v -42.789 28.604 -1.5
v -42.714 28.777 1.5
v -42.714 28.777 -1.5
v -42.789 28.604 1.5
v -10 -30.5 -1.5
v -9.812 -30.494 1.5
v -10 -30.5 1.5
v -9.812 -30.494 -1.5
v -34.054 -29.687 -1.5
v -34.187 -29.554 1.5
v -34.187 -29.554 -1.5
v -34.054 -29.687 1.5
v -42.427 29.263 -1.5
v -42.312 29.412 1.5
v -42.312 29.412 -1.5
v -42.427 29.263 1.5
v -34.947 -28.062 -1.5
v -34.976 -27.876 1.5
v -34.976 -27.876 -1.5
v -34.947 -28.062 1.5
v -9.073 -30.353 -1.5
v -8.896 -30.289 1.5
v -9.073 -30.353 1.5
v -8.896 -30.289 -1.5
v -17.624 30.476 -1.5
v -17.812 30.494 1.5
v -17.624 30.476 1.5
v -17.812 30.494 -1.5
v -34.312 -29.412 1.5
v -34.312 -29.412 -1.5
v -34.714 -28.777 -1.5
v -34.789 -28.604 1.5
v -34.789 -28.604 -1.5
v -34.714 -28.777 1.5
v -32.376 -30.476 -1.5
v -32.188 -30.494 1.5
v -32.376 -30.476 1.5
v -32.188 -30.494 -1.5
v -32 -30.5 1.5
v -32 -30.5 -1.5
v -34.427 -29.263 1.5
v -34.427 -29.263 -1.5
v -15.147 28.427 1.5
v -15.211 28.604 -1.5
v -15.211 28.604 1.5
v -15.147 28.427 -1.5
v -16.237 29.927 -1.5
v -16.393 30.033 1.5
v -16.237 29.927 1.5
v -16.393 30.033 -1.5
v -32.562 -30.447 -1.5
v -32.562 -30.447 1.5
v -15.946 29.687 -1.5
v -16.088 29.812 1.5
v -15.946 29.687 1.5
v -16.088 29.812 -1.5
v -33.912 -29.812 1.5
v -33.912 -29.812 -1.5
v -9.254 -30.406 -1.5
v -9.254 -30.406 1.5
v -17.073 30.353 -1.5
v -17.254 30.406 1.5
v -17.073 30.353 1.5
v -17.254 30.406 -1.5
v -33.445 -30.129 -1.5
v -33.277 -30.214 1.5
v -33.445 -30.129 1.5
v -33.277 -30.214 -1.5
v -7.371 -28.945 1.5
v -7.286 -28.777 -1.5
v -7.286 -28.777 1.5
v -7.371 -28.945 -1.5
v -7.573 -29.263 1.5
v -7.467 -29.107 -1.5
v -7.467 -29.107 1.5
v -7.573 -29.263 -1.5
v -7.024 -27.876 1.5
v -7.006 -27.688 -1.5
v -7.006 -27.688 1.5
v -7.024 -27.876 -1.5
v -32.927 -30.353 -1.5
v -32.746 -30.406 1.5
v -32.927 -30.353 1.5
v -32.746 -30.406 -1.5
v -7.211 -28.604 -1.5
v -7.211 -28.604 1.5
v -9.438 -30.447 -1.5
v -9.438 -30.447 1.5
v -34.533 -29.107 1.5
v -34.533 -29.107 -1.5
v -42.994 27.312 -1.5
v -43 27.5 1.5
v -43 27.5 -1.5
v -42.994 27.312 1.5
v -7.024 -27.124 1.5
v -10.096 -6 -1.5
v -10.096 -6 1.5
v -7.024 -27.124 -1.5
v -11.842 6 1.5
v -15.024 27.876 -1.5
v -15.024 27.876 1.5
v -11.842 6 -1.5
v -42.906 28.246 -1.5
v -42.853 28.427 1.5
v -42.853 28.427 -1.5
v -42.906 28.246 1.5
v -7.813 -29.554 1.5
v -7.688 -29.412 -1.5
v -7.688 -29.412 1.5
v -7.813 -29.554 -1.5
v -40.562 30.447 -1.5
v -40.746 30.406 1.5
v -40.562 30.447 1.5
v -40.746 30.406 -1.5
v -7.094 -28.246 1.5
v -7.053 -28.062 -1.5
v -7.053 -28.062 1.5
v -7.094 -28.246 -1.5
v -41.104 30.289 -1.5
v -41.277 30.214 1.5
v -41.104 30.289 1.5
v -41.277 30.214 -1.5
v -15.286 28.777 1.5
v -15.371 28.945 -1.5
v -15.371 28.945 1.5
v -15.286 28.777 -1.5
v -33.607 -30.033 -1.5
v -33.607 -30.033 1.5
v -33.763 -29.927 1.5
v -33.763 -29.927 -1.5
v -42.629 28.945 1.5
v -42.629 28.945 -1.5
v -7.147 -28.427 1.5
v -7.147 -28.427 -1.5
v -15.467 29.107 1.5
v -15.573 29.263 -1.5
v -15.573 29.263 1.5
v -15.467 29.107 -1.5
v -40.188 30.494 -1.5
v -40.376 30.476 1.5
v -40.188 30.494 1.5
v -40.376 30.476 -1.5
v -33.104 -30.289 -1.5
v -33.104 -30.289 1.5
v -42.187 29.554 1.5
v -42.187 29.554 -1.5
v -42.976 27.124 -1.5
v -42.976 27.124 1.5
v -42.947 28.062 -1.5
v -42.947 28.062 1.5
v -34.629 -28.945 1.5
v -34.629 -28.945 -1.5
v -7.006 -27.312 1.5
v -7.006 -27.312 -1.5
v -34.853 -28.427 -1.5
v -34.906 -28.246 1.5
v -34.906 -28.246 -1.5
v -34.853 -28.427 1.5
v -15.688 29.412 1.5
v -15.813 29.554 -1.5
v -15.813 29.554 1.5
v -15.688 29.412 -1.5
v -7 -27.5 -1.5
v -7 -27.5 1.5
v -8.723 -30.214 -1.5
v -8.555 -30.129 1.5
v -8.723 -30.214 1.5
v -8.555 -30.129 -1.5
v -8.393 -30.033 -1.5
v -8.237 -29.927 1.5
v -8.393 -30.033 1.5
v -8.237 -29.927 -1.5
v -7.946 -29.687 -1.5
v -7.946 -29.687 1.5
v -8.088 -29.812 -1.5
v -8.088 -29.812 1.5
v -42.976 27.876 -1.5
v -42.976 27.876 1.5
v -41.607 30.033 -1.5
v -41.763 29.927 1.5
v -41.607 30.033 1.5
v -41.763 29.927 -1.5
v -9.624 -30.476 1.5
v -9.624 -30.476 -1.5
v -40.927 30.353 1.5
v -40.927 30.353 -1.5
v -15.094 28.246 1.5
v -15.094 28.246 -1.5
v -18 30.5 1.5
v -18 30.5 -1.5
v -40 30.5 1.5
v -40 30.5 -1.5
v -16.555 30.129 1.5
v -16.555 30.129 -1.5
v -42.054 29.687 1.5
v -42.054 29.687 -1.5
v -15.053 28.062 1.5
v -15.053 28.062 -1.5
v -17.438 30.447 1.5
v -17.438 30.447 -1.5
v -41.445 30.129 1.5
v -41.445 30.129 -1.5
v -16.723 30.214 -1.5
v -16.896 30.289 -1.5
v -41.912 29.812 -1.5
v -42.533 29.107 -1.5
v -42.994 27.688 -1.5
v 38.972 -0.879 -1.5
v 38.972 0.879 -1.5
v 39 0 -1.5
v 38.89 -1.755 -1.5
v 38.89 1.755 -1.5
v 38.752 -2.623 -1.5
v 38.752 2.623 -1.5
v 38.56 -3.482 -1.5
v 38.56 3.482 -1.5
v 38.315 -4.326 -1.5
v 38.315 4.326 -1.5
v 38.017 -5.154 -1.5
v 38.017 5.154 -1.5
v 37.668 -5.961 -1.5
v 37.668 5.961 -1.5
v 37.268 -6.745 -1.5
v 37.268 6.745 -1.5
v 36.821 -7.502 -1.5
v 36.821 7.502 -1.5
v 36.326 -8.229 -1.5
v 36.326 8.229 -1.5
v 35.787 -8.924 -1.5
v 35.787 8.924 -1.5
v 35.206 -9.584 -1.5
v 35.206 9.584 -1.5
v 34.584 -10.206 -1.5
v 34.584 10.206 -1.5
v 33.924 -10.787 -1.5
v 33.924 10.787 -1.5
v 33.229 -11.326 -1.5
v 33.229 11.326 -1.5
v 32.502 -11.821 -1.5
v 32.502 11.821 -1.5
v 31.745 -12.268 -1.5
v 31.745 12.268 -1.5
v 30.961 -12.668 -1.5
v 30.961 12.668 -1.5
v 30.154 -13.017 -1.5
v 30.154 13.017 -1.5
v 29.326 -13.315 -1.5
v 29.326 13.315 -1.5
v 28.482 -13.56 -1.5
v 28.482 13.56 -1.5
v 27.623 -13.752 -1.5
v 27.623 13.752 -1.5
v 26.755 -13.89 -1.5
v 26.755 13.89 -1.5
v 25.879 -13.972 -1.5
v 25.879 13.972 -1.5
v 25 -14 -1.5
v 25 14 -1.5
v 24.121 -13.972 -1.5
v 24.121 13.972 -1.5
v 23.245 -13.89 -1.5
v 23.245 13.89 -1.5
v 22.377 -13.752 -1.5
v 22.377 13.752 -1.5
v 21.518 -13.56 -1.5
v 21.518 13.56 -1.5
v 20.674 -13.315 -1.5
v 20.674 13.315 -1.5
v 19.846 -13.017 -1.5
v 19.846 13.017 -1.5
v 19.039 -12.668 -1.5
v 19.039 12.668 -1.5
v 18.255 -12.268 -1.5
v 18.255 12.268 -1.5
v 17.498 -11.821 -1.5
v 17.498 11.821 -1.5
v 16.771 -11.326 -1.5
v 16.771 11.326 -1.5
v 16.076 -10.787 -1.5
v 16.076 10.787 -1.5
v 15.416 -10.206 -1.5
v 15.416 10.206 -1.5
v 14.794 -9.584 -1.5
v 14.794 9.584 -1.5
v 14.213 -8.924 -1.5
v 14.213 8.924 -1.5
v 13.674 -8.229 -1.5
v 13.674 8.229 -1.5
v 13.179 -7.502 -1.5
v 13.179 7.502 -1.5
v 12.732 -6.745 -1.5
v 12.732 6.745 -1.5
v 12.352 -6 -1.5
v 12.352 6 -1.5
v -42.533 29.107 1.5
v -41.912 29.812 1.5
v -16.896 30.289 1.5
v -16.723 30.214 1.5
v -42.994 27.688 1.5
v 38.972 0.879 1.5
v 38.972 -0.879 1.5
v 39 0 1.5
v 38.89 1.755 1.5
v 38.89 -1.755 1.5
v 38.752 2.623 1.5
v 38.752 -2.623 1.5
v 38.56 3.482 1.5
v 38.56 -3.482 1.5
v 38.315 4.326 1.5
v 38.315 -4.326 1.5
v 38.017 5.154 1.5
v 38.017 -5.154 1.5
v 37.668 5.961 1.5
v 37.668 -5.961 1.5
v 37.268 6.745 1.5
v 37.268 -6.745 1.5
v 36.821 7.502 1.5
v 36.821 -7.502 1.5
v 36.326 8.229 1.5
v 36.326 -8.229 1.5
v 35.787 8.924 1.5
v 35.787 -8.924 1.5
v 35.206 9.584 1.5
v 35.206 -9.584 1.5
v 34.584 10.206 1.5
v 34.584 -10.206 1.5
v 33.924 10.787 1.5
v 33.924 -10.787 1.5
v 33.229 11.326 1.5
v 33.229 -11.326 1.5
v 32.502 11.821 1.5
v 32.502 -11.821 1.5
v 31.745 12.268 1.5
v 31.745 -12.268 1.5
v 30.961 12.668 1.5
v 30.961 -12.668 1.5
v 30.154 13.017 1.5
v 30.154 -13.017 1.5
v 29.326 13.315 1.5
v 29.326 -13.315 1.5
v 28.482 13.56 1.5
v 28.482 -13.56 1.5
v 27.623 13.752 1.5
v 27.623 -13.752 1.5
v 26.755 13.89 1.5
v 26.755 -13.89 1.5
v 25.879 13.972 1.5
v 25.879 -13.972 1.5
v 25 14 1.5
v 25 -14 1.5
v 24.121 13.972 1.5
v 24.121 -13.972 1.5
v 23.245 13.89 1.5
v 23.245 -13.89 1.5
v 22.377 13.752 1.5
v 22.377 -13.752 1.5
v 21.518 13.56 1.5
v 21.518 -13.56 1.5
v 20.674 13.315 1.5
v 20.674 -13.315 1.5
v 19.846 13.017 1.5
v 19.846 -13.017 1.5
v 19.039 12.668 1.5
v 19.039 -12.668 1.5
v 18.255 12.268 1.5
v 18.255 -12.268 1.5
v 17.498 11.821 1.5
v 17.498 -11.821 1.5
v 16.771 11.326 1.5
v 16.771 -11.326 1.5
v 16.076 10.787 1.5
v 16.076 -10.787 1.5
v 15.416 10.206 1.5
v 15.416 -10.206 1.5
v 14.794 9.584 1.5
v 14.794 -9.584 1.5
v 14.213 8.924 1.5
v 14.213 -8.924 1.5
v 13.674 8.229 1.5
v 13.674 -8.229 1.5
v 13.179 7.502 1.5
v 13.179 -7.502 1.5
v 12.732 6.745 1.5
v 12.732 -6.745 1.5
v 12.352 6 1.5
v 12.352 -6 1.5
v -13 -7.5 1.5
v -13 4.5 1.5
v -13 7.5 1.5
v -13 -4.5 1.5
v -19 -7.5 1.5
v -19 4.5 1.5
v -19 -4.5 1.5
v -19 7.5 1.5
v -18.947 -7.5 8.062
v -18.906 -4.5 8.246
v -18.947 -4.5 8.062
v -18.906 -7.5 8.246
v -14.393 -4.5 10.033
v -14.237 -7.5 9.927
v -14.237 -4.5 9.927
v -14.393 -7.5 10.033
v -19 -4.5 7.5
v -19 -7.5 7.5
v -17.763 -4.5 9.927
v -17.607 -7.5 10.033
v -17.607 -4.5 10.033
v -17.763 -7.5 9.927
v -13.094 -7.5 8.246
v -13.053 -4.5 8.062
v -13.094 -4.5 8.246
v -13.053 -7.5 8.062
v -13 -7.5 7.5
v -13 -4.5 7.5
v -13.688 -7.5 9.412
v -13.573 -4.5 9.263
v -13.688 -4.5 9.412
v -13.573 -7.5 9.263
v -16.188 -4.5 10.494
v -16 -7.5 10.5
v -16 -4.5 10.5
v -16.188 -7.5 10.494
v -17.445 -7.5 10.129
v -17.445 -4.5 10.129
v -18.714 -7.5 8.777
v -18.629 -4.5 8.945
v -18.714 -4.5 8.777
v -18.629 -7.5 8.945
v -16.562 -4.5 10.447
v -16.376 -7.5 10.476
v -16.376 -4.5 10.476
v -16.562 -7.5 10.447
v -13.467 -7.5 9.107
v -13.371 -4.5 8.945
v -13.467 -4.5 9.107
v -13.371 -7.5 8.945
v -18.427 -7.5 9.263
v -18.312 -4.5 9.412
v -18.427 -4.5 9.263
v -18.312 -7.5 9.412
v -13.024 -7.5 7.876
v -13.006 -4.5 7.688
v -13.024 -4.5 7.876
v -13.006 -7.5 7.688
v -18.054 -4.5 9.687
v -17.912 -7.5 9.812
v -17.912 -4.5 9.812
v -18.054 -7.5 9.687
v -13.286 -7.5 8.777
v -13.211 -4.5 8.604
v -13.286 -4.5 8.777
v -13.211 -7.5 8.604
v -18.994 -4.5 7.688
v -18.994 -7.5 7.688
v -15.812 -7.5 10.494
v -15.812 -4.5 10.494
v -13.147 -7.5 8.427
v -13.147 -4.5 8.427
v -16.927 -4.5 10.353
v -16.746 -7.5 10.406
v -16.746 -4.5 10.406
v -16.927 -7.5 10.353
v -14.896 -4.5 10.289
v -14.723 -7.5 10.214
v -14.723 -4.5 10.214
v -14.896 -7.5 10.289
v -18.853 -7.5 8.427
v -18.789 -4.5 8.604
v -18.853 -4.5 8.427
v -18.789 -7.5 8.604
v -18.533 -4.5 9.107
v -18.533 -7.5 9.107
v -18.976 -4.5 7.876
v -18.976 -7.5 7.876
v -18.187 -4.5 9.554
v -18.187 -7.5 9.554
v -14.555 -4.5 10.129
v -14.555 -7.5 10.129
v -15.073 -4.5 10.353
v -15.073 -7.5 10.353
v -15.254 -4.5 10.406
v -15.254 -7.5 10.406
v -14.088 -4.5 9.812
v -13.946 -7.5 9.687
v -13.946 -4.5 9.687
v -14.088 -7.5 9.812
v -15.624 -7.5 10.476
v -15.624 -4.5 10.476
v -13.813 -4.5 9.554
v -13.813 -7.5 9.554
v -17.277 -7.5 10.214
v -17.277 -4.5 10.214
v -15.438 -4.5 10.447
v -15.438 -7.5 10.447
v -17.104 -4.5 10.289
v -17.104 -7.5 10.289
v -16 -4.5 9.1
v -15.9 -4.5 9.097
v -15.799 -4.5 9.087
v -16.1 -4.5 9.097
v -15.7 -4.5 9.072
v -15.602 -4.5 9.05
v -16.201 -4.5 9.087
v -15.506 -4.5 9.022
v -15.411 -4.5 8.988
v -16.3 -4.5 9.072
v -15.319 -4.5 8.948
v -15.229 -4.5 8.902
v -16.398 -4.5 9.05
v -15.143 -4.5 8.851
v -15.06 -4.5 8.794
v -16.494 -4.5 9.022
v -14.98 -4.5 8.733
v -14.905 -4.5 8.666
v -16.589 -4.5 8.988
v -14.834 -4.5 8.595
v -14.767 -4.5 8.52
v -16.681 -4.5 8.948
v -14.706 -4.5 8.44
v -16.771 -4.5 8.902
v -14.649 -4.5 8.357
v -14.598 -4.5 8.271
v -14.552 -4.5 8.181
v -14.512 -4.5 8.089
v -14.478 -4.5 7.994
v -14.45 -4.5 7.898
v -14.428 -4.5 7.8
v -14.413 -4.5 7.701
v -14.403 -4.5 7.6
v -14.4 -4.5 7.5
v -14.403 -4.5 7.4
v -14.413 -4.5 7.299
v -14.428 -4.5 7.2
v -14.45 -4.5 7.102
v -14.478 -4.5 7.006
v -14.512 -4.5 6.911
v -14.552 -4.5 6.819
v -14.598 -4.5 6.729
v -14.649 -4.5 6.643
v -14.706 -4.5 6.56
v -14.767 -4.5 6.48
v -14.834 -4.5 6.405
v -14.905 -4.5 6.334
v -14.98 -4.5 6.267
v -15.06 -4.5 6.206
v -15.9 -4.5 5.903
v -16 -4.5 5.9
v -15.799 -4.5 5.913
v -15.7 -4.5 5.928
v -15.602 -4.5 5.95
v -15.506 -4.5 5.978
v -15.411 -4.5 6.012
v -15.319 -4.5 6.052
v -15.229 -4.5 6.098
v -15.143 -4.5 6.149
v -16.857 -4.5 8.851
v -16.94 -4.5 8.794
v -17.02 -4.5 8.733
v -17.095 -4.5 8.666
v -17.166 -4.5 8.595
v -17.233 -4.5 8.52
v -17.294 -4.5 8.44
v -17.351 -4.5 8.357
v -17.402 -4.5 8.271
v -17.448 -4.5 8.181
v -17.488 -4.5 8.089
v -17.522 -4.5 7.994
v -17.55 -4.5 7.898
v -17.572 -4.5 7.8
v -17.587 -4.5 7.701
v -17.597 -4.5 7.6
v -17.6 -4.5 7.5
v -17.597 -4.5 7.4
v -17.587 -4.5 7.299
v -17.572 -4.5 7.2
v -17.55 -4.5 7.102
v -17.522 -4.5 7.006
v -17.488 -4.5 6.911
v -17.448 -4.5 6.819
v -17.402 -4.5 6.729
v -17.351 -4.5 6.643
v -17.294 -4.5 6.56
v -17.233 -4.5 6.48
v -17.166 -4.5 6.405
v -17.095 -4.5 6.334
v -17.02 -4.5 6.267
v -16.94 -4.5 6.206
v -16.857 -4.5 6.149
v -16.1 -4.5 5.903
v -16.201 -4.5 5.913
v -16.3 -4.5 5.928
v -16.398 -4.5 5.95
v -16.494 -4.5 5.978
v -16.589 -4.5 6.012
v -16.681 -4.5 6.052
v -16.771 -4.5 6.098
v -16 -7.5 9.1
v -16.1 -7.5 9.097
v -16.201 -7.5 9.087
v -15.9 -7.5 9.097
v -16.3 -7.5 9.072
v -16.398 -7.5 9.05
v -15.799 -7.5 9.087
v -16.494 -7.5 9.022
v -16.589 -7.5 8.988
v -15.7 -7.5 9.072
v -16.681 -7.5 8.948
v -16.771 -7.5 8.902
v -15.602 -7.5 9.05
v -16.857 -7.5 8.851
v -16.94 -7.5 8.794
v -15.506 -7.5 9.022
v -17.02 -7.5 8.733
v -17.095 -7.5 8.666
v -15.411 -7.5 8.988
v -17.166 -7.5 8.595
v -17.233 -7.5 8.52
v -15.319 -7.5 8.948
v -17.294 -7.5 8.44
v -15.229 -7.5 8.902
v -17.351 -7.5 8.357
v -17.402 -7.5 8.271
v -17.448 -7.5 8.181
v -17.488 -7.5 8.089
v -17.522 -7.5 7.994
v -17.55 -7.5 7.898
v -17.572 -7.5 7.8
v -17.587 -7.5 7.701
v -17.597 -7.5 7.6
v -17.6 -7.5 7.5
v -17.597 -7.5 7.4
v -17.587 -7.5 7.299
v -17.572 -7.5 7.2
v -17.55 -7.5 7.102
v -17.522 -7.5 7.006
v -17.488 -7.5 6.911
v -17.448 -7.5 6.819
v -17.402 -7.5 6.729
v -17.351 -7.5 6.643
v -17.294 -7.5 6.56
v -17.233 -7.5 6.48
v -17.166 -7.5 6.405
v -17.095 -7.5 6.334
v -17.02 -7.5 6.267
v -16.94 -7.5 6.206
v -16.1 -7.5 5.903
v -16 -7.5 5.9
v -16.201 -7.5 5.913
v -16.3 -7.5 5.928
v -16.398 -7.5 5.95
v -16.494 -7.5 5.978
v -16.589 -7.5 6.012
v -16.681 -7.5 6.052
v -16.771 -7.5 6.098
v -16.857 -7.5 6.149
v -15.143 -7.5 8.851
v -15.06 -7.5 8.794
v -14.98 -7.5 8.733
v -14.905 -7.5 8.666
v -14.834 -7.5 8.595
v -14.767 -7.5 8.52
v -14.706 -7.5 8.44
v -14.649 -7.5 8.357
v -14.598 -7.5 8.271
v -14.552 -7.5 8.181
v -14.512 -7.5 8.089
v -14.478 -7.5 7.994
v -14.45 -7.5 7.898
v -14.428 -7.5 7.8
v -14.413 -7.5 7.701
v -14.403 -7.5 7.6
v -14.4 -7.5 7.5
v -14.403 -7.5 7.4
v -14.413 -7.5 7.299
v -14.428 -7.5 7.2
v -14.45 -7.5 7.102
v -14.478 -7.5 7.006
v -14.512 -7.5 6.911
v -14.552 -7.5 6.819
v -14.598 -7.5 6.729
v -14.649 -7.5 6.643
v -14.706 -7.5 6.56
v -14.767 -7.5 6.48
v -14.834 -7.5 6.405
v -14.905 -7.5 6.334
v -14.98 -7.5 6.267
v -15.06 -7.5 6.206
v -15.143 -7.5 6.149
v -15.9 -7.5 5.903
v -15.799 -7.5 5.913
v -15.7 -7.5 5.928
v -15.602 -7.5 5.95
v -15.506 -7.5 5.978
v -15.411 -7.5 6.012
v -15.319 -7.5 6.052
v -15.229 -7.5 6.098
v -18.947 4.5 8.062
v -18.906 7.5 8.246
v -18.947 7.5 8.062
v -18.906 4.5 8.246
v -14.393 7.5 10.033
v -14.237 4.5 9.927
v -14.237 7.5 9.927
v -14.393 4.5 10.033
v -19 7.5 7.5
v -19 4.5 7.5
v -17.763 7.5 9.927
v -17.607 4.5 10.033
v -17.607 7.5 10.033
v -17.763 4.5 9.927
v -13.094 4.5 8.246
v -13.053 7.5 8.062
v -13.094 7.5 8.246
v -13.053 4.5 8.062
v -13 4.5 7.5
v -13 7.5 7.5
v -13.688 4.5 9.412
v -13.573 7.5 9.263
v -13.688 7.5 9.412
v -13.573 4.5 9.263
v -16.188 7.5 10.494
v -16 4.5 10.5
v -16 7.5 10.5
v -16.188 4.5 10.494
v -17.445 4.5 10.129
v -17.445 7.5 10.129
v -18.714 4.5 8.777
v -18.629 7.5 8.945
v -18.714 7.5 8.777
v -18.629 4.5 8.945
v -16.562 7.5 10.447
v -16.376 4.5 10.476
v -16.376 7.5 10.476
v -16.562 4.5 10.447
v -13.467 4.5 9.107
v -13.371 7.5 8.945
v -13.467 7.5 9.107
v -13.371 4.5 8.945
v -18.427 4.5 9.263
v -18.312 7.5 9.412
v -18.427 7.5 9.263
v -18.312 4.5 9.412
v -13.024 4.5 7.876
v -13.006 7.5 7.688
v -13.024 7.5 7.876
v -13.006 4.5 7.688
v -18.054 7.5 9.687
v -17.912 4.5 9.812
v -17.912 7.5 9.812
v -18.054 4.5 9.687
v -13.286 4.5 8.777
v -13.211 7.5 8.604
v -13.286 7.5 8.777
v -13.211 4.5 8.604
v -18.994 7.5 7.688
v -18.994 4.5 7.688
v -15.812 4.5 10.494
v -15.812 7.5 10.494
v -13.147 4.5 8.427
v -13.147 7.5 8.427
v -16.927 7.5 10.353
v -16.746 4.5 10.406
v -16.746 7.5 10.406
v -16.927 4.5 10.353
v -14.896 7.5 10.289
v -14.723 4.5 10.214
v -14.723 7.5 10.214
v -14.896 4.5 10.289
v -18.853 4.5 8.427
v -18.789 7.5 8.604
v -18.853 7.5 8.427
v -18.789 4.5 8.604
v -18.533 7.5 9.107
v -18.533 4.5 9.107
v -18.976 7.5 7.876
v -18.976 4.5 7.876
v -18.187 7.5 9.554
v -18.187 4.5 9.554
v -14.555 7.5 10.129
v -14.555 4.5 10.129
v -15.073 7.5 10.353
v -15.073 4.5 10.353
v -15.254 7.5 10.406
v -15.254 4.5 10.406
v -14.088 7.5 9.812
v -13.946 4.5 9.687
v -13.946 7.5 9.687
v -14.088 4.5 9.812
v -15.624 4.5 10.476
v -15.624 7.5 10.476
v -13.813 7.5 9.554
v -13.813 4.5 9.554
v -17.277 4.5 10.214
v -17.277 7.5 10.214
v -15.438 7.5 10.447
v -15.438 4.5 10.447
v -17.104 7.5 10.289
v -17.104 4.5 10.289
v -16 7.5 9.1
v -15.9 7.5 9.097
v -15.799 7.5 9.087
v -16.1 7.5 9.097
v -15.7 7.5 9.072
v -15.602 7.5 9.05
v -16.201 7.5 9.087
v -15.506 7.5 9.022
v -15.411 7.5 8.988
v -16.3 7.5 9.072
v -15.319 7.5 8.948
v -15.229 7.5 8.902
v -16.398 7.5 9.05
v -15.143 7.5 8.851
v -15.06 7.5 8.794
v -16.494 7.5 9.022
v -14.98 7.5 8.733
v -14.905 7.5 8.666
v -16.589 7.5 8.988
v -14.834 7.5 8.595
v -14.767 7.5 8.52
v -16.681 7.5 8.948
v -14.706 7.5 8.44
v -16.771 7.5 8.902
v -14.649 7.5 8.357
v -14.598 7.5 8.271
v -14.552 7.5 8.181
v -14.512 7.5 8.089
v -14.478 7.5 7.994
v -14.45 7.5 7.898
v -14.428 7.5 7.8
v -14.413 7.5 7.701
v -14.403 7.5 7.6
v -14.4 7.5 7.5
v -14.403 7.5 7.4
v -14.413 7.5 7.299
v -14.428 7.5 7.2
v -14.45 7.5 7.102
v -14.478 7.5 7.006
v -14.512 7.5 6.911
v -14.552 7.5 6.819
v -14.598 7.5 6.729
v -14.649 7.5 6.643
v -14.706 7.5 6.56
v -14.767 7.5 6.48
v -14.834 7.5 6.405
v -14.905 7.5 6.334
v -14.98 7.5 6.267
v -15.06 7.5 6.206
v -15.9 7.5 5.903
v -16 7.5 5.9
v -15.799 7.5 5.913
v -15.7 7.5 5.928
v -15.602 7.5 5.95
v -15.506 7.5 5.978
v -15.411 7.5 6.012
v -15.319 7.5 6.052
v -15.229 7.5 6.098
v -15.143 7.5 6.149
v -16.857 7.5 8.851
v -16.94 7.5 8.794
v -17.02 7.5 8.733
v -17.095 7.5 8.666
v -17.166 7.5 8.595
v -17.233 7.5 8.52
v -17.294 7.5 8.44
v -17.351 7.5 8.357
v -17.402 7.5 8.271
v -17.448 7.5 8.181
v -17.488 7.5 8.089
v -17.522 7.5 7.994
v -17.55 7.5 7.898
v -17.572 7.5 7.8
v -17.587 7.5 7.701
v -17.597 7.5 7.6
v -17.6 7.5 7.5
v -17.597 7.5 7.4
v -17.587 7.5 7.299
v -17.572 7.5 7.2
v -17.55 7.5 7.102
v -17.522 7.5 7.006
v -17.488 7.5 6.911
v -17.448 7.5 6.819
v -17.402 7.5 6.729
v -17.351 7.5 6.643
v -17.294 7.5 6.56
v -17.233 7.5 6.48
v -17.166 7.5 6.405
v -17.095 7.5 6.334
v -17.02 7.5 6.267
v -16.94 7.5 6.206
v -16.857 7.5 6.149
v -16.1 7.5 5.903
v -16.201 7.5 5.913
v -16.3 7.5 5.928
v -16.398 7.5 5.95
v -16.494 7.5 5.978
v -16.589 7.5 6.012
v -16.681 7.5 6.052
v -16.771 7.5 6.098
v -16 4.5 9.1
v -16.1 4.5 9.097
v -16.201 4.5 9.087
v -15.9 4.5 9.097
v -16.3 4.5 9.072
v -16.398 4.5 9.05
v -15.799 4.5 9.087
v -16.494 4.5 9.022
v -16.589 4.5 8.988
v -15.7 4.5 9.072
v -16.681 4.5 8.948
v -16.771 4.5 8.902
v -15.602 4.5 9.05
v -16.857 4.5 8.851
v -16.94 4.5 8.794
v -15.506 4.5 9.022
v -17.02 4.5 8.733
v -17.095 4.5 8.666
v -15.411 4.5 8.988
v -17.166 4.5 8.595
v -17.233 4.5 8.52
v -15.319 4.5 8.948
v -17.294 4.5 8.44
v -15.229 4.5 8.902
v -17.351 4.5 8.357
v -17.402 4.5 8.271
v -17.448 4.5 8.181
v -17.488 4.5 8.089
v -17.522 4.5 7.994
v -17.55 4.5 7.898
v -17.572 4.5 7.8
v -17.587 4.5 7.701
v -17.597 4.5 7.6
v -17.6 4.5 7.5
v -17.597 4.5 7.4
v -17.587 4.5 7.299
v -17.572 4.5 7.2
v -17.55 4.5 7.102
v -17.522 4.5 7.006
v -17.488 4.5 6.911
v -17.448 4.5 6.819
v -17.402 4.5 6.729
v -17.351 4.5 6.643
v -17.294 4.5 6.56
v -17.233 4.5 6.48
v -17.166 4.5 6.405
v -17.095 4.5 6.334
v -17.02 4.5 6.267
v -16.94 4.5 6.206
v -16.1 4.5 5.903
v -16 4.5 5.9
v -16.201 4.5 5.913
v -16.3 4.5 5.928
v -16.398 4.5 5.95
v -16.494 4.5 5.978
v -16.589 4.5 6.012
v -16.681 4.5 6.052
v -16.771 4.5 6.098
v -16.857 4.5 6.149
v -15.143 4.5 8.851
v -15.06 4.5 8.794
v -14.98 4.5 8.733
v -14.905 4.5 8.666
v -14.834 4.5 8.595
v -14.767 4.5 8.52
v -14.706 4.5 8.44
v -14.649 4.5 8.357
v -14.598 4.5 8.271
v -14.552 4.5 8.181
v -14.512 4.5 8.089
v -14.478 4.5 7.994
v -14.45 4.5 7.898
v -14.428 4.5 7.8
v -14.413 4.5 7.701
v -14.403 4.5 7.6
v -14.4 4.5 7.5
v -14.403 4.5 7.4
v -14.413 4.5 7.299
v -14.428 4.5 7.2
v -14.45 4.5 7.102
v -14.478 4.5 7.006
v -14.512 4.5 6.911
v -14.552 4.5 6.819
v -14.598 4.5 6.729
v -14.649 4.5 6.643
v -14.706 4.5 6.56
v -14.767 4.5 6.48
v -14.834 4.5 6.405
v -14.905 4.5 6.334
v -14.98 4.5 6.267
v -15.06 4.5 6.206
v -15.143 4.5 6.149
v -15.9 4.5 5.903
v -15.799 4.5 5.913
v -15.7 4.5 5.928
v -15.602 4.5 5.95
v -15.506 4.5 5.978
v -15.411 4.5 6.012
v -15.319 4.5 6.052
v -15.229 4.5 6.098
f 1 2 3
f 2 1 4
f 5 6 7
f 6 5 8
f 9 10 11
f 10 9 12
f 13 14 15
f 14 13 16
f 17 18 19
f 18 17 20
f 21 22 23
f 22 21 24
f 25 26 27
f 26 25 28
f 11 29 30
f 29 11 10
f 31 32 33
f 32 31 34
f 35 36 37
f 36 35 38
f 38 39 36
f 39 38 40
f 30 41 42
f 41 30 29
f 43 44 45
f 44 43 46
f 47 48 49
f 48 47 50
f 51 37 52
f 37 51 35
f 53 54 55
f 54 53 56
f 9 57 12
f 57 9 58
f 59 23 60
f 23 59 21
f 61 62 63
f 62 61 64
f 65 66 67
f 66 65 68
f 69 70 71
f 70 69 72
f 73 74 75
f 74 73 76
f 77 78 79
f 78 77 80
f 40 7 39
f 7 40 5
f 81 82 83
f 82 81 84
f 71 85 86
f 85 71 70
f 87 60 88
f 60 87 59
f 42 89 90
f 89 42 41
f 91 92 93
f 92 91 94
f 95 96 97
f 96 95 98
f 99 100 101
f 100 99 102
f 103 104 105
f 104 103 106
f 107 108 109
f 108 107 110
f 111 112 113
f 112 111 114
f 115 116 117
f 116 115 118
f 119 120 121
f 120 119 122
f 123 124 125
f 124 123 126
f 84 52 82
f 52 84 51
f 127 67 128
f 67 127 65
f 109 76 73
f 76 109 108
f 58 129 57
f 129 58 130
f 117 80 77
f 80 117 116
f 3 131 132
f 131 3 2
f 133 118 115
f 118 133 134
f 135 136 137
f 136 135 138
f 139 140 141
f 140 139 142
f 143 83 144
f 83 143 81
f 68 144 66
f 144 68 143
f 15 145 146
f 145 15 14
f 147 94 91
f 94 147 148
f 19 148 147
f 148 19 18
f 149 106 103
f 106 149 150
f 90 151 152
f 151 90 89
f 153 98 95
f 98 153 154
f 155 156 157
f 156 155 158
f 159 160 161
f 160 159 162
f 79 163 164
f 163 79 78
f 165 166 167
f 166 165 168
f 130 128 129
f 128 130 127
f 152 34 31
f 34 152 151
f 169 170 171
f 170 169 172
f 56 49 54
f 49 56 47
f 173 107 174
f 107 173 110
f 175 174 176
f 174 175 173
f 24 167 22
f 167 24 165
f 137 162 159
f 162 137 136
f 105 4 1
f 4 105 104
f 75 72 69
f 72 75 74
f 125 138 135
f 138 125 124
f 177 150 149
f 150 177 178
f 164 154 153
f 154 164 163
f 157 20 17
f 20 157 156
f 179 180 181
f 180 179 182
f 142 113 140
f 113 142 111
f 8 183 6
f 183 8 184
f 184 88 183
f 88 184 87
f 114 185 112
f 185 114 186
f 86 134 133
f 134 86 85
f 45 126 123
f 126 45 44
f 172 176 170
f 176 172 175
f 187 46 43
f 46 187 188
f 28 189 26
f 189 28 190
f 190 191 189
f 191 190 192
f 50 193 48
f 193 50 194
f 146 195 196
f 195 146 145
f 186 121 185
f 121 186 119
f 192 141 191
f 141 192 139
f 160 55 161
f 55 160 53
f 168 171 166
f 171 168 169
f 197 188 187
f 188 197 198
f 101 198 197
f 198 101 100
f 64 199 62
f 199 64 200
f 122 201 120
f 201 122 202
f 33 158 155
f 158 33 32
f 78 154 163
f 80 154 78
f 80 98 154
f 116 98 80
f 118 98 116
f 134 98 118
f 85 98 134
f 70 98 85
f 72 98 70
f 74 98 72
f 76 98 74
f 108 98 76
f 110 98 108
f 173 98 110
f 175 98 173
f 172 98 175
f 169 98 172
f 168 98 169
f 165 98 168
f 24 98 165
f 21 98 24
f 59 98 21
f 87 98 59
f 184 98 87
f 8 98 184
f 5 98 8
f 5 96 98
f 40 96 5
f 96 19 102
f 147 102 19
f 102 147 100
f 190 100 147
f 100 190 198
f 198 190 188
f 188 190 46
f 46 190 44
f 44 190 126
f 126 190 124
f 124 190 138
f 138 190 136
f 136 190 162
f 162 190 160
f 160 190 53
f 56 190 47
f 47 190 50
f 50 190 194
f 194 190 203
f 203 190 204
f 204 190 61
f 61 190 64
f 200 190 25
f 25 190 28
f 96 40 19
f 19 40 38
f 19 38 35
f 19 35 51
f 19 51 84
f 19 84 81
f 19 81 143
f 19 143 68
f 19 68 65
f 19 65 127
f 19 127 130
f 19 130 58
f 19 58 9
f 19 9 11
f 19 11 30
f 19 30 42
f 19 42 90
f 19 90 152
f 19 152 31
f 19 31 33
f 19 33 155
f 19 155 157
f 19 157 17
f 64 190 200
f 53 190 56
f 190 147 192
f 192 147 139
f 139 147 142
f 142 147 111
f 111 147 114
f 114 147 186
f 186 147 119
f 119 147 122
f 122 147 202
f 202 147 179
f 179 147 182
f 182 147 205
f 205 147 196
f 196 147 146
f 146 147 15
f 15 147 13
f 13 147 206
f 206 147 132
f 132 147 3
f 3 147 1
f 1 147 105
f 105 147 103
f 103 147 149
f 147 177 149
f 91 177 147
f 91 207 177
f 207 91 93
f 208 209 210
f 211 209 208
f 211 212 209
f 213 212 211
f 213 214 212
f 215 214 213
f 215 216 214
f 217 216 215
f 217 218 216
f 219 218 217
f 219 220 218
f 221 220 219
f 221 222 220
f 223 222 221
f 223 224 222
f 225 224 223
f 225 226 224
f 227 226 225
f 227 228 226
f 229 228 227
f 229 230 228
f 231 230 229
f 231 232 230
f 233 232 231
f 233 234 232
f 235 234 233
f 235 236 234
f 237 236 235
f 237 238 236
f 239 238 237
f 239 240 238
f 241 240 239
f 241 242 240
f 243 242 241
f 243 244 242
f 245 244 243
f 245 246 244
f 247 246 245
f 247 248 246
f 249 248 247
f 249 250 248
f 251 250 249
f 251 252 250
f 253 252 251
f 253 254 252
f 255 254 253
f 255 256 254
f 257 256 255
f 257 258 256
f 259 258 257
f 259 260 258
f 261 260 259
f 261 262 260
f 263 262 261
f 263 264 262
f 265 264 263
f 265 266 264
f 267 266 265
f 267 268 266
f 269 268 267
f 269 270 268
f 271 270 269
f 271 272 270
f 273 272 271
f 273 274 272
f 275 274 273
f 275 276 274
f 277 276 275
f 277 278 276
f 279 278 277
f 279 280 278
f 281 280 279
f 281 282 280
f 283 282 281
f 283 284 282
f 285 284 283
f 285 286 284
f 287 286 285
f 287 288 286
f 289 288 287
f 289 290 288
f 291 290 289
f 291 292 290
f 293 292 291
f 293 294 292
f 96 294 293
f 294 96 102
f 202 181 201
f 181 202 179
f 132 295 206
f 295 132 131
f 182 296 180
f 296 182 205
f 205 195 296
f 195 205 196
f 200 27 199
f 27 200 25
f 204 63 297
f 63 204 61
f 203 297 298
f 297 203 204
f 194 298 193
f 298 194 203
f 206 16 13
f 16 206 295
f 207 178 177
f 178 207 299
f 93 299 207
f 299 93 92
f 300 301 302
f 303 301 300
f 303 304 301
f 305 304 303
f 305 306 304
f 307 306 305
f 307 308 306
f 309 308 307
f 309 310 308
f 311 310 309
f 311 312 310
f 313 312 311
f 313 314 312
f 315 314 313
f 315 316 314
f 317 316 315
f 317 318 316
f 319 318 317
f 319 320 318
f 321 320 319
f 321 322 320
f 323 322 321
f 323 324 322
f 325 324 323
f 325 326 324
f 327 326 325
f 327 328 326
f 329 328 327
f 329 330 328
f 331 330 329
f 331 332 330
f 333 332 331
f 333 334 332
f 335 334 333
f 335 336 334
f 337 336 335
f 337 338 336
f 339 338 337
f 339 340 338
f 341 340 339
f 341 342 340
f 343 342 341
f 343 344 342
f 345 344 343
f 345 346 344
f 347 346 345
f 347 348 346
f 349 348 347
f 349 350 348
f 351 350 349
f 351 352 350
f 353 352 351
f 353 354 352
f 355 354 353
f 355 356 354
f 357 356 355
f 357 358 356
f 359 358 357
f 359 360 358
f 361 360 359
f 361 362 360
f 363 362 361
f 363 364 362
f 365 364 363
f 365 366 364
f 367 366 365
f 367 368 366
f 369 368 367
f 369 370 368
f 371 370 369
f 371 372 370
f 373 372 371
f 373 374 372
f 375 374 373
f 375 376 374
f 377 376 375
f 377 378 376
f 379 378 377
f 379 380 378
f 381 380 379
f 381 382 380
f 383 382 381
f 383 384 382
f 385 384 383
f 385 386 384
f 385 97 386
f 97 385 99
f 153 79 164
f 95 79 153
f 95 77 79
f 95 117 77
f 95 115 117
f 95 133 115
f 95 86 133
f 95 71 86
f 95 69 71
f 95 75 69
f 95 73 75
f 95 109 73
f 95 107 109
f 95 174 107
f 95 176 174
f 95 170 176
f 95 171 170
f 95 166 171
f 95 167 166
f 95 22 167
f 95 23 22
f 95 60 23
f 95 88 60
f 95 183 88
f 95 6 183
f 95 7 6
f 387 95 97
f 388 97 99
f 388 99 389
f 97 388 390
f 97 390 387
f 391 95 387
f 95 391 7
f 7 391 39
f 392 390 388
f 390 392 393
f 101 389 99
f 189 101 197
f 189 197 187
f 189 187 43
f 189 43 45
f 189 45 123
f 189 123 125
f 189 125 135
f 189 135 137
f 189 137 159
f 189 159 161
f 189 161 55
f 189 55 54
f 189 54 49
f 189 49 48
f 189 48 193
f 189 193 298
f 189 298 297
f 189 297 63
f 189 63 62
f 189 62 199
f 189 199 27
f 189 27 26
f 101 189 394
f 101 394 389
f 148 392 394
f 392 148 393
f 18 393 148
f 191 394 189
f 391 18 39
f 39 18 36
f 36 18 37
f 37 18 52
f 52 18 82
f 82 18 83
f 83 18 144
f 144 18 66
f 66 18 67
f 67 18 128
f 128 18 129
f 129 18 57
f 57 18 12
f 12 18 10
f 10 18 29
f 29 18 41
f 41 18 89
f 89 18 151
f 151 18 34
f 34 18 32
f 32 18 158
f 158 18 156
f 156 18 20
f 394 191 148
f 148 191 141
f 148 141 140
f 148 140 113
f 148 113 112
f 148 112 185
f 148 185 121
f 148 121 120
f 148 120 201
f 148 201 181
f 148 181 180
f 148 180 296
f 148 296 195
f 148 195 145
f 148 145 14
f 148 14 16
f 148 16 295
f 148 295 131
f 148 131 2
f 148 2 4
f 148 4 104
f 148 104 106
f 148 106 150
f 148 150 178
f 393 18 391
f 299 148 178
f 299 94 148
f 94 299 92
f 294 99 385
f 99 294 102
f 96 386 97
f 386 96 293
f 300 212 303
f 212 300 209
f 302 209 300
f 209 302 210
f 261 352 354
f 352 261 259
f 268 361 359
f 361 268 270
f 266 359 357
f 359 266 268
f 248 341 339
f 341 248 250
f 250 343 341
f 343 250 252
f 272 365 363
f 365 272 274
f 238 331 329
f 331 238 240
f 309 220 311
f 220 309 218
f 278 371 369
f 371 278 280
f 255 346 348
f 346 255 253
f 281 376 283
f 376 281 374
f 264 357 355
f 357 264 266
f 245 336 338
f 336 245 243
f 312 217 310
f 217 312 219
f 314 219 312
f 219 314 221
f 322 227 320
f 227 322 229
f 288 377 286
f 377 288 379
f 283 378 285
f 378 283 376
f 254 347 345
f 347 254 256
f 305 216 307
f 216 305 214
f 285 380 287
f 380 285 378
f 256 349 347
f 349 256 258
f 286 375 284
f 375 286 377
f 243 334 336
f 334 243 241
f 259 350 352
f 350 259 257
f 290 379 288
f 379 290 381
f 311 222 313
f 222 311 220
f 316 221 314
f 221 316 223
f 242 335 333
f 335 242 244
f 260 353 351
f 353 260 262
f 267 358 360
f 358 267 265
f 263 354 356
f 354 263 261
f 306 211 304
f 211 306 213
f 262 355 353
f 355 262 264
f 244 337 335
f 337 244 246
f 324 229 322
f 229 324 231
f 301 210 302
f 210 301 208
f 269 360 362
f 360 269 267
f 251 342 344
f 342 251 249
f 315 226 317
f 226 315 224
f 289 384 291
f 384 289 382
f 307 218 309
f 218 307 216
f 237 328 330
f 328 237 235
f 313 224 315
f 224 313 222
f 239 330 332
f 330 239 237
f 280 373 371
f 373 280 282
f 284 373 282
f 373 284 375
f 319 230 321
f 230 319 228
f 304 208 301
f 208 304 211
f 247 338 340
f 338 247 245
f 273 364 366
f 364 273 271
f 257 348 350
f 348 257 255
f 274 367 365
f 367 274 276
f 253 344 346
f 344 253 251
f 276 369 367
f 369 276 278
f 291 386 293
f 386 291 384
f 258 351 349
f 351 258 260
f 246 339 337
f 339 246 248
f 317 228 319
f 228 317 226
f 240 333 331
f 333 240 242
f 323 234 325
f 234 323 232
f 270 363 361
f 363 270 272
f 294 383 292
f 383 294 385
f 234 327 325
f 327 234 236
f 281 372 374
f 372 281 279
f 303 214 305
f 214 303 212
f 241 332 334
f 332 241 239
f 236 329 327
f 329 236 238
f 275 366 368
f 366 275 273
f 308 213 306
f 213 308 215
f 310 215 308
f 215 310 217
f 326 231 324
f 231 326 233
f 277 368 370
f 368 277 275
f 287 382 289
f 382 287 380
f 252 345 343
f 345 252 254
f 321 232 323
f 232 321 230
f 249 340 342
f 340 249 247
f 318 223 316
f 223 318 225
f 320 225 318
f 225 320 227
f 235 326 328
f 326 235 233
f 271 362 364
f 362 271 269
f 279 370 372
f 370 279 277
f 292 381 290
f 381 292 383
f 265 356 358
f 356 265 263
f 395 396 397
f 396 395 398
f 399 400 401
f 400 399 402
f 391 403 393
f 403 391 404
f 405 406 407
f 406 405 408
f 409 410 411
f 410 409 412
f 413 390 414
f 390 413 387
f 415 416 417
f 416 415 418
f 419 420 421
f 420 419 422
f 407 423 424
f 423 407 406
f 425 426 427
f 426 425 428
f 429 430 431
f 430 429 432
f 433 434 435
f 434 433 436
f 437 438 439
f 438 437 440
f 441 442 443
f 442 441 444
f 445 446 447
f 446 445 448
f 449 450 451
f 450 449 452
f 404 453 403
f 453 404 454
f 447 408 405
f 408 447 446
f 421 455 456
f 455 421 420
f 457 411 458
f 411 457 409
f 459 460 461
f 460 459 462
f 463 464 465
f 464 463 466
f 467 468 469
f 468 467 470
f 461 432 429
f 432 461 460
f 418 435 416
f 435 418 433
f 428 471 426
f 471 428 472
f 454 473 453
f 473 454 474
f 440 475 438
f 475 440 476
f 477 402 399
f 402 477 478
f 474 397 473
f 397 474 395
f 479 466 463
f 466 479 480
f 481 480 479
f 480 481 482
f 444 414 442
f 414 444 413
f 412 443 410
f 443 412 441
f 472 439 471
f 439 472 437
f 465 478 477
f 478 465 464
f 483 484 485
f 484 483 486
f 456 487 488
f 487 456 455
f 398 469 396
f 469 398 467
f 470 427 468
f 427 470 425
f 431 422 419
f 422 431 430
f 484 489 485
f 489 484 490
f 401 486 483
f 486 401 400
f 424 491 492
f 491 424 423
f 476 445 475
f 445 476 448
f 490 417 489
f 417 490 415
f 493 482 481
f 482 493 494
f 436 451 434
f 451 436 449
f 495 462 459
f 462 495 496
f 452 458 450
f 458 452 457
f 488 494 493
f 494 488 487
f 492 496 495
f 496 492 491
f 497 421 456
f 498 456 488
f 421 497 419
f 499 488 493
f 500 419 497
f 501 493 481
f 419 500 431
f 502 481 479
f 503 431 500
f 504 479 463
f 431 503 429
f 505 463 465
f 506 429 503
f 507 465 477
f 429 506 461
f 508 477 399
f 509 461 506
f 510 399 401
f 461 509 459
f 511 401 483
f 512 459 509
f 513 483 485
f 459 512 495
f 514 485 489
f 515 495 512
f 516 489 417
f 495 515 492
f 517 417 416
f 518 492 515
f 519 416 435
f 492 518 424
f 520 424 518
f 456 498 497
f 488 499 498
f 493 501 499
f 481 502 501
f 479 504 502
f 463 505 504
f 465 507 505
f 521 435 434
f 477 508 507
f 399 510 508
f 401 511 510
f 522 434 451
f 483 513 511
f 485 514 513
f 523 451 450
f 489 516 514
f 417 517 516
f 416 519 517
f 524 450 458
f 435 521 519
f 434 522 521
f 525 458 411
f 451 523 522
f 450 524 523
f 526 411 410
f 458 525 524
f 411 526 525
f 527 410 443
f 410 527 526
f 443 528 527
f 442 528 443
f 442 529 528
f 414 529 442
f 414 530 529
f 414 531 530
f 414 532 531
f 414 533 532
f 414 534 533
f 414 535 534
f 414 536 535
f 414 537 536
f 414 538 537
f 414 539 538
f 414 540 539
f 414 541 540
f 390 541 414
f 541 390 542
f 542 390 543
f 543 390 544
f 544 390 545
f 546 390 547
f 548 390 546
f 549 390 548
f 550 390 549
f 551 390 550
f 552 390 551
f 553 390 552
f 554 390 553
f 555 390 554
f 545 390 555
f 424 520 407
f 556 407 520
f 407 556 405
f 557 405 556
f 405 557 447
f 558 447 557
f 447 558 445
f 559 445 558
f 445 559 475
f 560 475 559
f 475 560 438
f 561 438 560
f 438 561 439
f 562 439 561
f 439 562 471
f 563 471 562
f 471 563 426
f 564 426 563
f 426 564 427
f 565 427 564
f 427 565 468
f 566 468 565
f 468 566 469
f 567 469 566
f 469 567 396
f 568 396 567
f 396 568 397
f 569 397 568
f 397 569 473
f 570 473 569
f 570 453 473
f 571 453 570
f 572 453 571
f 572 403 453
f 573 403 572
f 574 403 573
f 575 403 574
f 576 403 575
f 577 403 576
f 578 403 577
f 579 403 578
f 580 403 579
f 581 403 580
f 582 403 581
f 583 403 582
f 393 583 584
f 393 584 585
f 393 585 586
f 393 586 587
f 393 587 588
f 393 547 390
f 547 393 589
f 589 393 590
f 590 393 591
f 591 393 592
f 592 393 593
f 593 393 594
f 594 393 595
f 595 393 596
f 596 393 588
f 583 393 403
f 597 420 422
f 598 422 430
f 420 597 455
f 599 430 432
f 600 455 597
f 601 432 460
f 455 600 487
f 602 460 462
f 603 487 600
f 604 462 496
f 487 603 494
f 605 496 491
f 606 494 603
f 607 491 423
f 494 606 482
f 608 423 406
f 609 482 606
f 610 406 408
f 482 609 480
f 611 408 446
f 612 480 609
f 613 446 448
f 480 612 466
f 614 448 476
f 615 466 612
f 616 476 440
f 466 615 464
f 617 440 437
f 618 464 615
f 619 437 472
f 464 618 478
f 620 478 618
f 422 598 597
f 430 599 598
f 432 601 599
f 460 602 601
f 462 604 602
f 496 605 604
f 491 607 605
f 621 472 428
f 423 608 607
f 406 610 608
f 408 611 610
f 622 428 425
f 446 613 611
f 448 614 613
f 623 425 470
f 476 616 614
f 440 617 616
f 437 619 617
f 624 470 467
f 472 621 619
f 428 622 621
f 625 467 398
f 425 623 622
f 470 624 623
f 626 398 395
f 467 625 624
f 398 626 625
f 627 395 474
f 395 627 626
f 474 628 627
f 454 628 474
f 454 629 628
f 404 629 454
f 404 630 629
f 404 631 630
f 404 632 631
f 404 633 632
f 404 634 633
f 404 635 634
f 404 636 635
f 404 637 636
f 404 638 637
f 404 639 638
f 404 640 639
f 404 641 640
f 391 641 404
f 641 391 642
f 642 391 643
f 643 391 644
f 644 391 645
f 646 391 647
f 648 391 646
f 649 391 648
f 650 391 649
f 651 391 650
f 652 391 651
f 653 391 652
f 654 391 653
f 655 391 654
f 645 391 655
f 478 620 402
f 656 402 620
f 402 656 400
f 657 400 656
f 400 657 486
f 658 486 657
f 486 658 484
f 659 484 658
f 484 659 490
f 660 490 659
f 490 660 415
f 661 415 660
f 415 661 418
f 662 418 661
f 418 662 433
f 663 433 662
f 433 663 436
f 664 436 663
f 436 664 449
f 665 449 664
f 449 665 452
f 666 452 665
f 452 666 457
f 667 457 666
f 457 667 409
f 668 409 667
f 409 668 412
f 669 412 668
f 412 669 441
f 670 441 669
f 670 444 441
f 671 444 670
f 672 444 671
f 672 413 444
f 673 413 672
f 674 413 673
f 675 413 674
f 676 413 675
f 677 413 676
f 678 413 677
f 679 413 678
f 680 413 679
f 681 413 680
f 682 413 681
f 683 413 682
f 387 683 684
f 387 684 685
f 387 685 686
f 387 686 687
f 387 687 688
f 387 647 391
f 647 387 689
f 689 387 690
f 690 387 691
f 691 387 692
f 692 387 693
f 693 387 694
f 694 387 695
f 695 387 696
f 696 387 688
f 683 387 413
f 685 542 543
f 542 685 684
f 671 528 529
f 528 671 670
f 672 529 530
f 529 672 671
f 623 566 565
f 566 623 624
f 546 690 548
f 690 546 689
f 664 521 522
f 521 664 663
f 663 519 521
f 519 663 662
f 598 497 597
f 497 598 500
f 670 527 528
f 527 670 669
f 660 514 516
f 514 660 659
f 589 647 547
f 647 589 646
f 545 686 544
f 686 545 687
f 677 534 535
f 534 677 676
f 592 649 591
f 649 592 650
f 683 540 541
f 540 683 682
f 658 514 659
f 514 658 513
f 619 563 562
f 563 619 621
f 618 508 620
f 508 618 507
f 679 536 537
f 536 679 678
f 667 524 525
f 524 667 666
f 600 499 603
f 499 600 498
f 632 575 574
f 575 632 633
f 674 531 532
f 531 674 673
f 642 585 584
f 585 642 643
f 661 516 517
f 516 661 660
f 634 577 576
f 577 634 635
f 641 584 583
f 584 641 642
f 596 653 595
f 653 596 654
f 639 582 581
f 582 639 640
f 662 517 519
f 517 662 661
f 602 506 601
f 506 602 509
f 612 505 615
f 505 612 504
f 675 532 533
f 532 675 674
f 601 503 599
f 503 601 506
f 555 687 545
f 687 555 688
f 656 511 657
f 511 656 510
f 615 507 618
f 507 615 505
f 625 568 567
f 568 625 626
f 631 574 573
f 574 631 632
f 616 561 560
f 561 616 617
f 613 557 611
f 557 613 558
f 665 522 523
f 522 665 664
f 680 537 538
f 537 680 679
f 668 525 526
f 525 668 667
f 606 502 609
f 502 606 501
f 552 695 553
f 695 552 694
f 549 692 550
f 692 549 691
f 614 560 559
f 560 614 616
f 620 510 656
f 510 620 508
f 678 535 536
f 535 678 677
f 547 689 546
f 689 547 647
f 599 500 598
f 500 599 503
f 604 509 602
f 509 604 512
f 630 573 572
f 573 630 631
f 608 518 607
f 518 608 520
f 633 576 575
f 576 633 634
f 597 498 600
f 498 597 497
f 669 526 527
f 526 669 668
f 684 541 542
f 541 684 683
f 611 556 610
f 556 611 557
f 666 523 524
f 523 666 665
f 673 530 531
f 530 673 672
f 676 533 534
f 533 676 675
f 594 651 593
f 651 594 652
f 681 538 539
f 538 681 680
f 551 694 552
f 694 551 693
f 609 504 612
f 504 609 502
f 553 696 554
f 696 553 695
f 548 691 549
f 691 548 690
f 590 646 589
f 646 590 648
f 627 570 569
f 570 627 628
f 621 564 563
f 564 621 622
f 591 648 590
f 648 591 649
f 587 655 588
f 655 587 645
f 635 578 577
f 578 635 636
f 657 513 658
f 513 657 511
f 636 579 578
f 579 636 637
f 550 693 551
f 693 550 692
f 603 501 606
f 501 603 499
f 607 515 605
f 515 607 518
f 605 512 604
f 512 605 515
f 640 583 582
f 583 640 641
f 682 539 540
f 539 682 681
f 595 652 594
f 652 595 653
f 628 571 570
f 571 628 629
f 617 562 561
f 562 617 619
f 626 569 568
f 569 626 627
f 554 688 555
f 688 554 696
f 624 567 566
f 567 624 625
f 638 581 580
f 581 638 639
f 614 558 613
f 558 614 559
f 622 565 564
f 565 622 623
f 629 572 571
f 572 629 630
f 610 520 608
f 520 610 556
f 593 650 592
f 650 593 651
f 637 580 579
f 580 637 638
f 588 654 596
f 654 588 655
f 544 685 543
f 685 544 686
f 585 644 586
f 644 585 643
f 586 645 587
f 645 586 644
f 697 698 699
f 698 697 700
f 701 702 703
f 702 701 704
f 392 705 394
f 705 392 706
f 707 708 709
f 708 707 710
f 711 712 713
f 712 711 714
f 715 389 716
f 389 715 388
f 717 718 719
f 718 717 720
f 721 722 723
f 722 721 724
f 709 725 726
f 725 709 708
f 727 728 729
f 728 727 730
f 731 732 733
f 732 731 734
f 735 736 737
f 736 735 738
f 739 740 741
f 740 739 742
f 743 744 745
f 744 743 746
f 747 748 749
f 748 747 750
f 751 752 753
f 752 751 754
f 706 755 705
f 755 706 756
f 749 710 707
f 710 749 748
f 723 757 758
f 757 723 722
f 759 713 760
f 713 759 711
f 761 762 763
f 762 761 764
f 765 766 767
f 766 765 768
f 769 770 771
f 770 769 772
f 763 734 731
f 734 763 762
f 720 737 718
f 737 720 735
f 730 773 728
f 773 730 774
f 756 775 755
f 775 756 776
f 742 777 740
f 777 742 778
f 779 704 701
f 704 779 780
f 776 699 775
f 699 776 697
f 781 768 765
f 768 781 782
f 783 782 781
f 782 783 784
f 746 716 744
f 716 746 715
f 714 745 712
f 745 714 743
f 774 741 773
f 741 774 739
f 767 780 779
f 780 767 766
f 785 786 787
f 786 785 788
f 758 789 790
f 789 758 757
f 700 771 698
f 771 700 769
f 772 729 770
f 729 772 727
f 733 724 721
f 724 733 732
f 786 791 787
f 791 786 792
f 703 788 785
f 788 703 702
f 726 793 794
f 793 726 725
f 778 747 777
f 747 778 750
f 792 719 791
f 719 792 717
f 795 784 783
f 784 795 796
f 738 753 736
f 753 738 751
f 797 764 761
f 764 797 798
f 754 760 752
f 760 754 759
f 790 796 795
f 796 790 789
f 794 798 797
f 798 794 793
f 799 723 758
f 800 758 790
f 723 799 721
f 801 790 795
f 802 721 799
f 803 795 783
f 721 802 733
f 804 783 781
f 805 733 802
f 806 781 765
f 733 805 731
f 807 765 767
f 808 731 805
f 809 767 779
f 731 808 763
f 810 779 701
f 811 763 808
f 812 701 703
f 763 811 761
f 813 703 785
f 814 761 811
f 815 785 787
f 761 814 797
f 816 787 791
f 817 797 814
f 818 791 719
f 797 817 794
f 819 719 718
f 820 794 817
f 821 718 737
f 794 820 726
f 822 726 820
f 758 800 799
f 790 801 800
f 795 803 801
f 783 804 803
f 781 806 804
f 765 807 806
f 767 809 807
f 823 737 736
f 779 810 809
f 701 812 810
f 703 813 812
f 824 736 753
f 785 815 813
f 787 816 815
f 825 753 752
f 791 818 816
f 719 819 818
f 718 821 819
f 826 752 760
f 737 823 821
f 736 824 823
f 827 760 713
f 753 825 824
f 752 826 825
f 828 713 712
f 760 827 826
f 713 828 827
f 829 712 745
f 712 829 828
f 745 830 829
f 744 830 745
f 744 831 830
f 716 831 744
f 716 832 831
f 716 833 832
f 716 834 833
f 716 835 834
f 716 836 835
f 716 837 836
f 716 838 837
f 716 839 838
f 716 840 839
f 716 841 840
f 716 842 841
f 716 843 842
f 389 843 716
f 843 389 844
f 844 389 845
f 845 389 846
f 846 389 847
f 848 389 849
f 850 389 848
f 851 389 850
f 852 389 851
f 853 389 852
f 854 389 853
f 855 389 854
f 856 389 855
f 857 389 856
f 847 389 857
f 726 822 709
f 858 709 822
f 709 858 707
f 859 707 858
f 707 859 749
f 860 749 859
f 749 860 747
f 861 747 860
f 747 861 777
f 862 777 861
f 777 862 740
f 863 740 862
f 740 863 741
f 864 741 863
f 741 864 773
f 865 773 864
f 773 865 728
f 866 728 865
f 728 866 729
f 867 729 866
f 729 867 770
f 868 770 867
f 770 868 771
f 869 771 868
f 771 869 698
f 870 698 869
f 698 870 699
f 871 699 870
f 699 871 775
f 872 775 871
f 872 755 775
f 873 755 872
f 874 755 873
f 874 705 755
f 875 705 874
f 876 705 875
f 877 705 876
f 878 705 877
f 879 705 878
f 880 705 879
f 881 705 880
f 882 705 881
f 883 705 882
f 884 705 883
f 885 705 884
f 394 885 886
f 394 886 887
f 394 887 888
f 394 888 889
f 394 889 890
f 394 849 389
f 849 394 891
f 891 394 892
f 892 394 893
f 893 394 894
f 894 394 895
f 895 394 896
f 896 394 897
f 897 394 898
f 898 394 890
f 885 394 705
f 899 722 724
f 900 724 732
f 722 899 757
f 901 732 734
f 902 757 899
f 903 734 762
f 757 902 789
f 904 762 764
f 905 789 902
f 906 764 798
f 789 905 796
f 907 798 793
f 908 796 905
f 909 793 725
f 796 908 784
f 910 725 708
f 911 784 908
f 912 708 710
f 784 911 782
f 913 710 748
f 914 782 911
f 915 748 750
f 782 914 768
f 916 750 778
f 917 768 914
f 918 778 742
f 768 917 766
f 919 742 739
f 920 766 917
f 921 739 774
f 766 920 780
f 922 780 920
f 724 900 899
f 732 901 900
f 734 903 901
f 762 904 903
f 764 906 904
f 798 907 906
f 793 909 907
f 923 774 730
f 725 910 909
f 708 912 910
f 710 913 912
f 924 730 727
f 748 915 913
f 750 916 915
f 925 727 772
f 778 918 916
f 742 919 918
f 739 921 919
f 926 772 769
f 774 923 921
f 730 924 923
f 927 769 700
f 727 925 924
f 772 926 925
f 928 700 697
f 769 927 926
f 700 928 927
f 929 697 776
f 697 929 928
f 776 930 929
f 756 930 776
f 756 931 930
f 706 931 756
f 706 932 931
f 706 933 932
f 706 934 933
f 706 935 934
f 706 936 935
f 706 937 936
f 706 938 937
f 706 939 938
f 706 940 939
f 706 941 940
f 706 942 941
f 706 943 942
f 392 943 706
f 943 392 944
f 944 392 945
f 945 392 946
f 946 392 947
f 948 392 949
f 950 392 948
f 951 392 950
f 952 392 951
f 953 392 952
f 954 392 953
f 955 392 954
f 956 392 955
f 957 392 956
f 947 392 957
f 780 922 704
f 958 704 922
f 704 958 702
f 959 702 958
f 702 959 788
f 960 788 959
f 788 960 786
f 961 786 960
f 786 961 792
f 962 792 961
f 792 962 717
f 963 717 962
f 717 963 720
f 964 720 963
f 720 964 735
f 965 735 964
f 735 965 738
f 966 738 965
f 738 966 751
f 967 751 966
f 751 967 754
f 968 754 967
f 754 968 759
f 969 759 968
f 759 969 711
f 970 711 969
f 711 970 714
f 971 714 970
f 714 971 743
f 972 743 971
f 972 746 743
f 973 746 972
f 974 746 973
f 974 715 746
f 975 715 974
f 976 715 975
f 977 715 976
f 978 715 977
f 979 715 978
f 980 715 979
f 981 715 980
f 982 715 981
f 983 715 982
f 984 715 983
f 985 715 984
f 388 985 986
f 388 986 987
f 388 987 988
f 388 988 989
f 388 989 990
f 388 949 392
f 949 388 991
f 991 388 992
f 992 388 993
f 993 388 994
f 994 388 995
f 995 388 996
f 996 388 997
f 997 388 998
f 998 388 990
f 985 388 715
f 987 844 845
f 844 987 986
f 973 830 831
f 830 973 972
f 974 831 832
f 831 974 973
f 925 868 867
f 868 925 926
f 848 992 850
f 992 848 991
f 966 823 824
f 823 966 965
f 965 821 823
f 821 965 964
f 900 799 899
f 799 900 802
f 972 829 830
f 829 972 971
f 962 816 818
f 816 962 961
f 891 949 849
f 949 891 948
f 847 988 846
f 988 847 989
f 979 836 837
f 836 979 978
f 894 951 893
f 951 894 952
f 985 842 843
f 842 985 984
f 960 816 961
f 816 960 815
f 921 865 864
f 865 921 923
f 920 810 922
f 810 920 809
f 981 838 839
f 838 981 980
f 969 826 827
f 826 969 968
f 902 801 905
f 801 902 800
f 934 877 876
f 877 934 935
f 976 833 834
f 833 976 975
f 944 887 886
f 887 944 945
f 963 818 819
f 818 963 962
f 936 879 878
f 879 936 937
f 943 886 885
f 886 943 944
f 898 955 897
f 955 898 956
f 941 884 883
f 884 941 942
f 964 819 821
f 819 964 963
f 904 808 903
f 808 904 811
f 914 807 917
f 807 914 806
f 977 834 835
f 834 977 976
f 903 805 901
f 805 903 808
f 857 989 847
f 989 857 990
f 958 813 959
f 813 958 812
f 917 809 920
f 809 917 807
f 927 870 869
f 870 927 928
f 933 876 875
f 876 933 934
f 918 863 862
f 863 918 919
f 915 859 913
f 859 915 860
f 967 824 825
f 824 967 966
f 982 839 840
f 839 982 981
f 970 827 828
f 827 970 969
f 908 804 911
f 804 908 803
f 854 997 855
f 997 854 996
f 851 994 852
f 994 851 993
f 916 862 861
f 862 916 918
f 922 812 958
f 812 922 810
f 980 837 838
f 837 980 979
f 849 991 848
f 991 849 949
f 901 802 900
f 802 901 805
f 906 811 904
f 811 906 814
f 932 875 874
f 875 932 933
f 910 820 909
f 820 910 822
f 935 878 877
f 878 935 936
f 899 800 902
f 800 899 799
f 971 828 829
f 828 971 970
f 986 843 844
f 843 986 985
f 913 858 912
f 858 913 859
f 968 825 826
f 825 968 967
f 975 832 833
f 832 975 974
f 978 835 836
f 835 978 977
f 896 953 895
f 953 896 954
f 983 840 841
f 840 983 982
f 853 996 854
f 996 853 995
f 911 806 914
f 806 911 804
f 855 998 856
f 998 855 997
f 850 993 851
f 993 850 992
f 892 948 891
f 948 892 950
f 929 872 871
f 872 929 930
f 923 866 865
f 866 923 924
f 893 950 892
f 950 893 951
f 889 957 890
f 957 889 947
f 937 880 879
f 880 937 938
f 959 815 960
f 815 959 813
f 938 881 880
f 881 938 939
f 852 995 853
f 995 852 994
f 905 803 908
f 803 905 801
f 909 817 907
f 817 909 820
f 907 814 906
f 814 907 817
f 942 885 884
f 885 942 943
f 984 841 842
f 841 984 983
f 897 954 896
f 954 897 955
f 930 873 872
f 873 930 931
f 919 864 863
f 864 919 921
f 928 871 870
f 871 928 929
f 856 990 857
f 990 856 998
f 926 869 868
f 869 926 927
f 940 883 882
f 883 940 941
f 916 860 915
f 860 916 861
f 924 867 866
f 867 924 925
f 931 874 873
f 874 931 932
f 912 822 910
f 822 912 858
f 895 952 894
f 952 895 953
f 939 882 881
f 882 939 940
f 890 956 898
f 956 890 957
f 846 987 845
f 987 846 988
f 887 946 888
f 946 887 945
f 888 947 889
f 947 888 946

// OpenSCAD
HEIGHT = 3;
WIDTH = 75;
LENGTH = 100;

SLANT = 4;
NOTE_BODY_DIA = 28;

BAR_CORNER_DIA = 6;
BAR_TOP_WIDTH = NOTE_BODY_DIA;
BAR_TOP_LENGTH = WIDTH - NOTE_BODY_DIA/2;
BAR_CONN_LENGTH = LENGTH - NOTE_BODY_DIA/2 - 2*SLANT;
BAR_CONN_WIDTH = 12;

HINGE_RADIUS = 3;
HINGE_HOLE_RADIUS = 1.6;
HINGE_HEIGHT = 6;
HINGE_SPACING = 12;
HINGE_WIDTH = 3;

$fn = 100;

module rounded_rect(width, length, height, corner_dia, slant = 0) {
    hull() {
        for(i = [-1, 1]) {
            for(j = [-1, 1]) {
                translate([j == -1 ? -slant : slant, 0, 0])
                translate([i * (width-corner_dia)/2, j * (length-corner_dia)/2, 0])
                cylinder(d = corner_dia, h = height, center = true);
            }
        }
    }
}

module outline() {
    union() {
        translate([-(BAR_CONN_LENGTH-BAR_TOP_WIDTH)/2, 0, 0])
        rounded_rect(BAR_TOP_WIDTH, BAR_TOP_LENGTH, HEIGHT, BAR_CORNER_DIA, -SLANT);
        
        translate([+SLANT/2, 0, 0])
        rounded_rect(BAR_CONN_LENGTH - SLANT - NOTE_BODY_DIA/2, BAR_CONN_WIDTH, HEIGHT, BAR_CORNER_DIA);
        
        translate([(BAR_CONN_LENGTH-NOTE_BODY_DIA)/2, 0, 0])
        cylinder(d = NOTE_BODY_DIA, h = HEIGHT, center = true);
    }
}

module hinge() {
    difference() {
        hull() {
            translate([0, 0, HINGE_HEIGHT])
                rotate([90, 0, 0])
                    cylinder(r = HINGE_RADIUS, h = HINGE_WIDTH, center = true);
            translate([-HINGE_RADIUS, -HINGE_WIDTH/2, 0]) cube(size = [2 * HINGE_RADIUS, HINGE_WIDTH, 1]);
        }
        translate([0, 0, HINGE_HEIGHT])
            rotate([90, 0, 0])
                cylinder(r = HINGE_HOLE_RADIUS, h = HINGE_WIDTH+2, center = true);
    }
}

union() {
    outline();
    translate([-0.16*LENGTH, -HINGE_SPACING/2, HEIGHT/2])
        hinge();
    translate([-0.16*LENGTH, HINGE_SPACING/2, HEIGHT/2])
        hinge();
}
